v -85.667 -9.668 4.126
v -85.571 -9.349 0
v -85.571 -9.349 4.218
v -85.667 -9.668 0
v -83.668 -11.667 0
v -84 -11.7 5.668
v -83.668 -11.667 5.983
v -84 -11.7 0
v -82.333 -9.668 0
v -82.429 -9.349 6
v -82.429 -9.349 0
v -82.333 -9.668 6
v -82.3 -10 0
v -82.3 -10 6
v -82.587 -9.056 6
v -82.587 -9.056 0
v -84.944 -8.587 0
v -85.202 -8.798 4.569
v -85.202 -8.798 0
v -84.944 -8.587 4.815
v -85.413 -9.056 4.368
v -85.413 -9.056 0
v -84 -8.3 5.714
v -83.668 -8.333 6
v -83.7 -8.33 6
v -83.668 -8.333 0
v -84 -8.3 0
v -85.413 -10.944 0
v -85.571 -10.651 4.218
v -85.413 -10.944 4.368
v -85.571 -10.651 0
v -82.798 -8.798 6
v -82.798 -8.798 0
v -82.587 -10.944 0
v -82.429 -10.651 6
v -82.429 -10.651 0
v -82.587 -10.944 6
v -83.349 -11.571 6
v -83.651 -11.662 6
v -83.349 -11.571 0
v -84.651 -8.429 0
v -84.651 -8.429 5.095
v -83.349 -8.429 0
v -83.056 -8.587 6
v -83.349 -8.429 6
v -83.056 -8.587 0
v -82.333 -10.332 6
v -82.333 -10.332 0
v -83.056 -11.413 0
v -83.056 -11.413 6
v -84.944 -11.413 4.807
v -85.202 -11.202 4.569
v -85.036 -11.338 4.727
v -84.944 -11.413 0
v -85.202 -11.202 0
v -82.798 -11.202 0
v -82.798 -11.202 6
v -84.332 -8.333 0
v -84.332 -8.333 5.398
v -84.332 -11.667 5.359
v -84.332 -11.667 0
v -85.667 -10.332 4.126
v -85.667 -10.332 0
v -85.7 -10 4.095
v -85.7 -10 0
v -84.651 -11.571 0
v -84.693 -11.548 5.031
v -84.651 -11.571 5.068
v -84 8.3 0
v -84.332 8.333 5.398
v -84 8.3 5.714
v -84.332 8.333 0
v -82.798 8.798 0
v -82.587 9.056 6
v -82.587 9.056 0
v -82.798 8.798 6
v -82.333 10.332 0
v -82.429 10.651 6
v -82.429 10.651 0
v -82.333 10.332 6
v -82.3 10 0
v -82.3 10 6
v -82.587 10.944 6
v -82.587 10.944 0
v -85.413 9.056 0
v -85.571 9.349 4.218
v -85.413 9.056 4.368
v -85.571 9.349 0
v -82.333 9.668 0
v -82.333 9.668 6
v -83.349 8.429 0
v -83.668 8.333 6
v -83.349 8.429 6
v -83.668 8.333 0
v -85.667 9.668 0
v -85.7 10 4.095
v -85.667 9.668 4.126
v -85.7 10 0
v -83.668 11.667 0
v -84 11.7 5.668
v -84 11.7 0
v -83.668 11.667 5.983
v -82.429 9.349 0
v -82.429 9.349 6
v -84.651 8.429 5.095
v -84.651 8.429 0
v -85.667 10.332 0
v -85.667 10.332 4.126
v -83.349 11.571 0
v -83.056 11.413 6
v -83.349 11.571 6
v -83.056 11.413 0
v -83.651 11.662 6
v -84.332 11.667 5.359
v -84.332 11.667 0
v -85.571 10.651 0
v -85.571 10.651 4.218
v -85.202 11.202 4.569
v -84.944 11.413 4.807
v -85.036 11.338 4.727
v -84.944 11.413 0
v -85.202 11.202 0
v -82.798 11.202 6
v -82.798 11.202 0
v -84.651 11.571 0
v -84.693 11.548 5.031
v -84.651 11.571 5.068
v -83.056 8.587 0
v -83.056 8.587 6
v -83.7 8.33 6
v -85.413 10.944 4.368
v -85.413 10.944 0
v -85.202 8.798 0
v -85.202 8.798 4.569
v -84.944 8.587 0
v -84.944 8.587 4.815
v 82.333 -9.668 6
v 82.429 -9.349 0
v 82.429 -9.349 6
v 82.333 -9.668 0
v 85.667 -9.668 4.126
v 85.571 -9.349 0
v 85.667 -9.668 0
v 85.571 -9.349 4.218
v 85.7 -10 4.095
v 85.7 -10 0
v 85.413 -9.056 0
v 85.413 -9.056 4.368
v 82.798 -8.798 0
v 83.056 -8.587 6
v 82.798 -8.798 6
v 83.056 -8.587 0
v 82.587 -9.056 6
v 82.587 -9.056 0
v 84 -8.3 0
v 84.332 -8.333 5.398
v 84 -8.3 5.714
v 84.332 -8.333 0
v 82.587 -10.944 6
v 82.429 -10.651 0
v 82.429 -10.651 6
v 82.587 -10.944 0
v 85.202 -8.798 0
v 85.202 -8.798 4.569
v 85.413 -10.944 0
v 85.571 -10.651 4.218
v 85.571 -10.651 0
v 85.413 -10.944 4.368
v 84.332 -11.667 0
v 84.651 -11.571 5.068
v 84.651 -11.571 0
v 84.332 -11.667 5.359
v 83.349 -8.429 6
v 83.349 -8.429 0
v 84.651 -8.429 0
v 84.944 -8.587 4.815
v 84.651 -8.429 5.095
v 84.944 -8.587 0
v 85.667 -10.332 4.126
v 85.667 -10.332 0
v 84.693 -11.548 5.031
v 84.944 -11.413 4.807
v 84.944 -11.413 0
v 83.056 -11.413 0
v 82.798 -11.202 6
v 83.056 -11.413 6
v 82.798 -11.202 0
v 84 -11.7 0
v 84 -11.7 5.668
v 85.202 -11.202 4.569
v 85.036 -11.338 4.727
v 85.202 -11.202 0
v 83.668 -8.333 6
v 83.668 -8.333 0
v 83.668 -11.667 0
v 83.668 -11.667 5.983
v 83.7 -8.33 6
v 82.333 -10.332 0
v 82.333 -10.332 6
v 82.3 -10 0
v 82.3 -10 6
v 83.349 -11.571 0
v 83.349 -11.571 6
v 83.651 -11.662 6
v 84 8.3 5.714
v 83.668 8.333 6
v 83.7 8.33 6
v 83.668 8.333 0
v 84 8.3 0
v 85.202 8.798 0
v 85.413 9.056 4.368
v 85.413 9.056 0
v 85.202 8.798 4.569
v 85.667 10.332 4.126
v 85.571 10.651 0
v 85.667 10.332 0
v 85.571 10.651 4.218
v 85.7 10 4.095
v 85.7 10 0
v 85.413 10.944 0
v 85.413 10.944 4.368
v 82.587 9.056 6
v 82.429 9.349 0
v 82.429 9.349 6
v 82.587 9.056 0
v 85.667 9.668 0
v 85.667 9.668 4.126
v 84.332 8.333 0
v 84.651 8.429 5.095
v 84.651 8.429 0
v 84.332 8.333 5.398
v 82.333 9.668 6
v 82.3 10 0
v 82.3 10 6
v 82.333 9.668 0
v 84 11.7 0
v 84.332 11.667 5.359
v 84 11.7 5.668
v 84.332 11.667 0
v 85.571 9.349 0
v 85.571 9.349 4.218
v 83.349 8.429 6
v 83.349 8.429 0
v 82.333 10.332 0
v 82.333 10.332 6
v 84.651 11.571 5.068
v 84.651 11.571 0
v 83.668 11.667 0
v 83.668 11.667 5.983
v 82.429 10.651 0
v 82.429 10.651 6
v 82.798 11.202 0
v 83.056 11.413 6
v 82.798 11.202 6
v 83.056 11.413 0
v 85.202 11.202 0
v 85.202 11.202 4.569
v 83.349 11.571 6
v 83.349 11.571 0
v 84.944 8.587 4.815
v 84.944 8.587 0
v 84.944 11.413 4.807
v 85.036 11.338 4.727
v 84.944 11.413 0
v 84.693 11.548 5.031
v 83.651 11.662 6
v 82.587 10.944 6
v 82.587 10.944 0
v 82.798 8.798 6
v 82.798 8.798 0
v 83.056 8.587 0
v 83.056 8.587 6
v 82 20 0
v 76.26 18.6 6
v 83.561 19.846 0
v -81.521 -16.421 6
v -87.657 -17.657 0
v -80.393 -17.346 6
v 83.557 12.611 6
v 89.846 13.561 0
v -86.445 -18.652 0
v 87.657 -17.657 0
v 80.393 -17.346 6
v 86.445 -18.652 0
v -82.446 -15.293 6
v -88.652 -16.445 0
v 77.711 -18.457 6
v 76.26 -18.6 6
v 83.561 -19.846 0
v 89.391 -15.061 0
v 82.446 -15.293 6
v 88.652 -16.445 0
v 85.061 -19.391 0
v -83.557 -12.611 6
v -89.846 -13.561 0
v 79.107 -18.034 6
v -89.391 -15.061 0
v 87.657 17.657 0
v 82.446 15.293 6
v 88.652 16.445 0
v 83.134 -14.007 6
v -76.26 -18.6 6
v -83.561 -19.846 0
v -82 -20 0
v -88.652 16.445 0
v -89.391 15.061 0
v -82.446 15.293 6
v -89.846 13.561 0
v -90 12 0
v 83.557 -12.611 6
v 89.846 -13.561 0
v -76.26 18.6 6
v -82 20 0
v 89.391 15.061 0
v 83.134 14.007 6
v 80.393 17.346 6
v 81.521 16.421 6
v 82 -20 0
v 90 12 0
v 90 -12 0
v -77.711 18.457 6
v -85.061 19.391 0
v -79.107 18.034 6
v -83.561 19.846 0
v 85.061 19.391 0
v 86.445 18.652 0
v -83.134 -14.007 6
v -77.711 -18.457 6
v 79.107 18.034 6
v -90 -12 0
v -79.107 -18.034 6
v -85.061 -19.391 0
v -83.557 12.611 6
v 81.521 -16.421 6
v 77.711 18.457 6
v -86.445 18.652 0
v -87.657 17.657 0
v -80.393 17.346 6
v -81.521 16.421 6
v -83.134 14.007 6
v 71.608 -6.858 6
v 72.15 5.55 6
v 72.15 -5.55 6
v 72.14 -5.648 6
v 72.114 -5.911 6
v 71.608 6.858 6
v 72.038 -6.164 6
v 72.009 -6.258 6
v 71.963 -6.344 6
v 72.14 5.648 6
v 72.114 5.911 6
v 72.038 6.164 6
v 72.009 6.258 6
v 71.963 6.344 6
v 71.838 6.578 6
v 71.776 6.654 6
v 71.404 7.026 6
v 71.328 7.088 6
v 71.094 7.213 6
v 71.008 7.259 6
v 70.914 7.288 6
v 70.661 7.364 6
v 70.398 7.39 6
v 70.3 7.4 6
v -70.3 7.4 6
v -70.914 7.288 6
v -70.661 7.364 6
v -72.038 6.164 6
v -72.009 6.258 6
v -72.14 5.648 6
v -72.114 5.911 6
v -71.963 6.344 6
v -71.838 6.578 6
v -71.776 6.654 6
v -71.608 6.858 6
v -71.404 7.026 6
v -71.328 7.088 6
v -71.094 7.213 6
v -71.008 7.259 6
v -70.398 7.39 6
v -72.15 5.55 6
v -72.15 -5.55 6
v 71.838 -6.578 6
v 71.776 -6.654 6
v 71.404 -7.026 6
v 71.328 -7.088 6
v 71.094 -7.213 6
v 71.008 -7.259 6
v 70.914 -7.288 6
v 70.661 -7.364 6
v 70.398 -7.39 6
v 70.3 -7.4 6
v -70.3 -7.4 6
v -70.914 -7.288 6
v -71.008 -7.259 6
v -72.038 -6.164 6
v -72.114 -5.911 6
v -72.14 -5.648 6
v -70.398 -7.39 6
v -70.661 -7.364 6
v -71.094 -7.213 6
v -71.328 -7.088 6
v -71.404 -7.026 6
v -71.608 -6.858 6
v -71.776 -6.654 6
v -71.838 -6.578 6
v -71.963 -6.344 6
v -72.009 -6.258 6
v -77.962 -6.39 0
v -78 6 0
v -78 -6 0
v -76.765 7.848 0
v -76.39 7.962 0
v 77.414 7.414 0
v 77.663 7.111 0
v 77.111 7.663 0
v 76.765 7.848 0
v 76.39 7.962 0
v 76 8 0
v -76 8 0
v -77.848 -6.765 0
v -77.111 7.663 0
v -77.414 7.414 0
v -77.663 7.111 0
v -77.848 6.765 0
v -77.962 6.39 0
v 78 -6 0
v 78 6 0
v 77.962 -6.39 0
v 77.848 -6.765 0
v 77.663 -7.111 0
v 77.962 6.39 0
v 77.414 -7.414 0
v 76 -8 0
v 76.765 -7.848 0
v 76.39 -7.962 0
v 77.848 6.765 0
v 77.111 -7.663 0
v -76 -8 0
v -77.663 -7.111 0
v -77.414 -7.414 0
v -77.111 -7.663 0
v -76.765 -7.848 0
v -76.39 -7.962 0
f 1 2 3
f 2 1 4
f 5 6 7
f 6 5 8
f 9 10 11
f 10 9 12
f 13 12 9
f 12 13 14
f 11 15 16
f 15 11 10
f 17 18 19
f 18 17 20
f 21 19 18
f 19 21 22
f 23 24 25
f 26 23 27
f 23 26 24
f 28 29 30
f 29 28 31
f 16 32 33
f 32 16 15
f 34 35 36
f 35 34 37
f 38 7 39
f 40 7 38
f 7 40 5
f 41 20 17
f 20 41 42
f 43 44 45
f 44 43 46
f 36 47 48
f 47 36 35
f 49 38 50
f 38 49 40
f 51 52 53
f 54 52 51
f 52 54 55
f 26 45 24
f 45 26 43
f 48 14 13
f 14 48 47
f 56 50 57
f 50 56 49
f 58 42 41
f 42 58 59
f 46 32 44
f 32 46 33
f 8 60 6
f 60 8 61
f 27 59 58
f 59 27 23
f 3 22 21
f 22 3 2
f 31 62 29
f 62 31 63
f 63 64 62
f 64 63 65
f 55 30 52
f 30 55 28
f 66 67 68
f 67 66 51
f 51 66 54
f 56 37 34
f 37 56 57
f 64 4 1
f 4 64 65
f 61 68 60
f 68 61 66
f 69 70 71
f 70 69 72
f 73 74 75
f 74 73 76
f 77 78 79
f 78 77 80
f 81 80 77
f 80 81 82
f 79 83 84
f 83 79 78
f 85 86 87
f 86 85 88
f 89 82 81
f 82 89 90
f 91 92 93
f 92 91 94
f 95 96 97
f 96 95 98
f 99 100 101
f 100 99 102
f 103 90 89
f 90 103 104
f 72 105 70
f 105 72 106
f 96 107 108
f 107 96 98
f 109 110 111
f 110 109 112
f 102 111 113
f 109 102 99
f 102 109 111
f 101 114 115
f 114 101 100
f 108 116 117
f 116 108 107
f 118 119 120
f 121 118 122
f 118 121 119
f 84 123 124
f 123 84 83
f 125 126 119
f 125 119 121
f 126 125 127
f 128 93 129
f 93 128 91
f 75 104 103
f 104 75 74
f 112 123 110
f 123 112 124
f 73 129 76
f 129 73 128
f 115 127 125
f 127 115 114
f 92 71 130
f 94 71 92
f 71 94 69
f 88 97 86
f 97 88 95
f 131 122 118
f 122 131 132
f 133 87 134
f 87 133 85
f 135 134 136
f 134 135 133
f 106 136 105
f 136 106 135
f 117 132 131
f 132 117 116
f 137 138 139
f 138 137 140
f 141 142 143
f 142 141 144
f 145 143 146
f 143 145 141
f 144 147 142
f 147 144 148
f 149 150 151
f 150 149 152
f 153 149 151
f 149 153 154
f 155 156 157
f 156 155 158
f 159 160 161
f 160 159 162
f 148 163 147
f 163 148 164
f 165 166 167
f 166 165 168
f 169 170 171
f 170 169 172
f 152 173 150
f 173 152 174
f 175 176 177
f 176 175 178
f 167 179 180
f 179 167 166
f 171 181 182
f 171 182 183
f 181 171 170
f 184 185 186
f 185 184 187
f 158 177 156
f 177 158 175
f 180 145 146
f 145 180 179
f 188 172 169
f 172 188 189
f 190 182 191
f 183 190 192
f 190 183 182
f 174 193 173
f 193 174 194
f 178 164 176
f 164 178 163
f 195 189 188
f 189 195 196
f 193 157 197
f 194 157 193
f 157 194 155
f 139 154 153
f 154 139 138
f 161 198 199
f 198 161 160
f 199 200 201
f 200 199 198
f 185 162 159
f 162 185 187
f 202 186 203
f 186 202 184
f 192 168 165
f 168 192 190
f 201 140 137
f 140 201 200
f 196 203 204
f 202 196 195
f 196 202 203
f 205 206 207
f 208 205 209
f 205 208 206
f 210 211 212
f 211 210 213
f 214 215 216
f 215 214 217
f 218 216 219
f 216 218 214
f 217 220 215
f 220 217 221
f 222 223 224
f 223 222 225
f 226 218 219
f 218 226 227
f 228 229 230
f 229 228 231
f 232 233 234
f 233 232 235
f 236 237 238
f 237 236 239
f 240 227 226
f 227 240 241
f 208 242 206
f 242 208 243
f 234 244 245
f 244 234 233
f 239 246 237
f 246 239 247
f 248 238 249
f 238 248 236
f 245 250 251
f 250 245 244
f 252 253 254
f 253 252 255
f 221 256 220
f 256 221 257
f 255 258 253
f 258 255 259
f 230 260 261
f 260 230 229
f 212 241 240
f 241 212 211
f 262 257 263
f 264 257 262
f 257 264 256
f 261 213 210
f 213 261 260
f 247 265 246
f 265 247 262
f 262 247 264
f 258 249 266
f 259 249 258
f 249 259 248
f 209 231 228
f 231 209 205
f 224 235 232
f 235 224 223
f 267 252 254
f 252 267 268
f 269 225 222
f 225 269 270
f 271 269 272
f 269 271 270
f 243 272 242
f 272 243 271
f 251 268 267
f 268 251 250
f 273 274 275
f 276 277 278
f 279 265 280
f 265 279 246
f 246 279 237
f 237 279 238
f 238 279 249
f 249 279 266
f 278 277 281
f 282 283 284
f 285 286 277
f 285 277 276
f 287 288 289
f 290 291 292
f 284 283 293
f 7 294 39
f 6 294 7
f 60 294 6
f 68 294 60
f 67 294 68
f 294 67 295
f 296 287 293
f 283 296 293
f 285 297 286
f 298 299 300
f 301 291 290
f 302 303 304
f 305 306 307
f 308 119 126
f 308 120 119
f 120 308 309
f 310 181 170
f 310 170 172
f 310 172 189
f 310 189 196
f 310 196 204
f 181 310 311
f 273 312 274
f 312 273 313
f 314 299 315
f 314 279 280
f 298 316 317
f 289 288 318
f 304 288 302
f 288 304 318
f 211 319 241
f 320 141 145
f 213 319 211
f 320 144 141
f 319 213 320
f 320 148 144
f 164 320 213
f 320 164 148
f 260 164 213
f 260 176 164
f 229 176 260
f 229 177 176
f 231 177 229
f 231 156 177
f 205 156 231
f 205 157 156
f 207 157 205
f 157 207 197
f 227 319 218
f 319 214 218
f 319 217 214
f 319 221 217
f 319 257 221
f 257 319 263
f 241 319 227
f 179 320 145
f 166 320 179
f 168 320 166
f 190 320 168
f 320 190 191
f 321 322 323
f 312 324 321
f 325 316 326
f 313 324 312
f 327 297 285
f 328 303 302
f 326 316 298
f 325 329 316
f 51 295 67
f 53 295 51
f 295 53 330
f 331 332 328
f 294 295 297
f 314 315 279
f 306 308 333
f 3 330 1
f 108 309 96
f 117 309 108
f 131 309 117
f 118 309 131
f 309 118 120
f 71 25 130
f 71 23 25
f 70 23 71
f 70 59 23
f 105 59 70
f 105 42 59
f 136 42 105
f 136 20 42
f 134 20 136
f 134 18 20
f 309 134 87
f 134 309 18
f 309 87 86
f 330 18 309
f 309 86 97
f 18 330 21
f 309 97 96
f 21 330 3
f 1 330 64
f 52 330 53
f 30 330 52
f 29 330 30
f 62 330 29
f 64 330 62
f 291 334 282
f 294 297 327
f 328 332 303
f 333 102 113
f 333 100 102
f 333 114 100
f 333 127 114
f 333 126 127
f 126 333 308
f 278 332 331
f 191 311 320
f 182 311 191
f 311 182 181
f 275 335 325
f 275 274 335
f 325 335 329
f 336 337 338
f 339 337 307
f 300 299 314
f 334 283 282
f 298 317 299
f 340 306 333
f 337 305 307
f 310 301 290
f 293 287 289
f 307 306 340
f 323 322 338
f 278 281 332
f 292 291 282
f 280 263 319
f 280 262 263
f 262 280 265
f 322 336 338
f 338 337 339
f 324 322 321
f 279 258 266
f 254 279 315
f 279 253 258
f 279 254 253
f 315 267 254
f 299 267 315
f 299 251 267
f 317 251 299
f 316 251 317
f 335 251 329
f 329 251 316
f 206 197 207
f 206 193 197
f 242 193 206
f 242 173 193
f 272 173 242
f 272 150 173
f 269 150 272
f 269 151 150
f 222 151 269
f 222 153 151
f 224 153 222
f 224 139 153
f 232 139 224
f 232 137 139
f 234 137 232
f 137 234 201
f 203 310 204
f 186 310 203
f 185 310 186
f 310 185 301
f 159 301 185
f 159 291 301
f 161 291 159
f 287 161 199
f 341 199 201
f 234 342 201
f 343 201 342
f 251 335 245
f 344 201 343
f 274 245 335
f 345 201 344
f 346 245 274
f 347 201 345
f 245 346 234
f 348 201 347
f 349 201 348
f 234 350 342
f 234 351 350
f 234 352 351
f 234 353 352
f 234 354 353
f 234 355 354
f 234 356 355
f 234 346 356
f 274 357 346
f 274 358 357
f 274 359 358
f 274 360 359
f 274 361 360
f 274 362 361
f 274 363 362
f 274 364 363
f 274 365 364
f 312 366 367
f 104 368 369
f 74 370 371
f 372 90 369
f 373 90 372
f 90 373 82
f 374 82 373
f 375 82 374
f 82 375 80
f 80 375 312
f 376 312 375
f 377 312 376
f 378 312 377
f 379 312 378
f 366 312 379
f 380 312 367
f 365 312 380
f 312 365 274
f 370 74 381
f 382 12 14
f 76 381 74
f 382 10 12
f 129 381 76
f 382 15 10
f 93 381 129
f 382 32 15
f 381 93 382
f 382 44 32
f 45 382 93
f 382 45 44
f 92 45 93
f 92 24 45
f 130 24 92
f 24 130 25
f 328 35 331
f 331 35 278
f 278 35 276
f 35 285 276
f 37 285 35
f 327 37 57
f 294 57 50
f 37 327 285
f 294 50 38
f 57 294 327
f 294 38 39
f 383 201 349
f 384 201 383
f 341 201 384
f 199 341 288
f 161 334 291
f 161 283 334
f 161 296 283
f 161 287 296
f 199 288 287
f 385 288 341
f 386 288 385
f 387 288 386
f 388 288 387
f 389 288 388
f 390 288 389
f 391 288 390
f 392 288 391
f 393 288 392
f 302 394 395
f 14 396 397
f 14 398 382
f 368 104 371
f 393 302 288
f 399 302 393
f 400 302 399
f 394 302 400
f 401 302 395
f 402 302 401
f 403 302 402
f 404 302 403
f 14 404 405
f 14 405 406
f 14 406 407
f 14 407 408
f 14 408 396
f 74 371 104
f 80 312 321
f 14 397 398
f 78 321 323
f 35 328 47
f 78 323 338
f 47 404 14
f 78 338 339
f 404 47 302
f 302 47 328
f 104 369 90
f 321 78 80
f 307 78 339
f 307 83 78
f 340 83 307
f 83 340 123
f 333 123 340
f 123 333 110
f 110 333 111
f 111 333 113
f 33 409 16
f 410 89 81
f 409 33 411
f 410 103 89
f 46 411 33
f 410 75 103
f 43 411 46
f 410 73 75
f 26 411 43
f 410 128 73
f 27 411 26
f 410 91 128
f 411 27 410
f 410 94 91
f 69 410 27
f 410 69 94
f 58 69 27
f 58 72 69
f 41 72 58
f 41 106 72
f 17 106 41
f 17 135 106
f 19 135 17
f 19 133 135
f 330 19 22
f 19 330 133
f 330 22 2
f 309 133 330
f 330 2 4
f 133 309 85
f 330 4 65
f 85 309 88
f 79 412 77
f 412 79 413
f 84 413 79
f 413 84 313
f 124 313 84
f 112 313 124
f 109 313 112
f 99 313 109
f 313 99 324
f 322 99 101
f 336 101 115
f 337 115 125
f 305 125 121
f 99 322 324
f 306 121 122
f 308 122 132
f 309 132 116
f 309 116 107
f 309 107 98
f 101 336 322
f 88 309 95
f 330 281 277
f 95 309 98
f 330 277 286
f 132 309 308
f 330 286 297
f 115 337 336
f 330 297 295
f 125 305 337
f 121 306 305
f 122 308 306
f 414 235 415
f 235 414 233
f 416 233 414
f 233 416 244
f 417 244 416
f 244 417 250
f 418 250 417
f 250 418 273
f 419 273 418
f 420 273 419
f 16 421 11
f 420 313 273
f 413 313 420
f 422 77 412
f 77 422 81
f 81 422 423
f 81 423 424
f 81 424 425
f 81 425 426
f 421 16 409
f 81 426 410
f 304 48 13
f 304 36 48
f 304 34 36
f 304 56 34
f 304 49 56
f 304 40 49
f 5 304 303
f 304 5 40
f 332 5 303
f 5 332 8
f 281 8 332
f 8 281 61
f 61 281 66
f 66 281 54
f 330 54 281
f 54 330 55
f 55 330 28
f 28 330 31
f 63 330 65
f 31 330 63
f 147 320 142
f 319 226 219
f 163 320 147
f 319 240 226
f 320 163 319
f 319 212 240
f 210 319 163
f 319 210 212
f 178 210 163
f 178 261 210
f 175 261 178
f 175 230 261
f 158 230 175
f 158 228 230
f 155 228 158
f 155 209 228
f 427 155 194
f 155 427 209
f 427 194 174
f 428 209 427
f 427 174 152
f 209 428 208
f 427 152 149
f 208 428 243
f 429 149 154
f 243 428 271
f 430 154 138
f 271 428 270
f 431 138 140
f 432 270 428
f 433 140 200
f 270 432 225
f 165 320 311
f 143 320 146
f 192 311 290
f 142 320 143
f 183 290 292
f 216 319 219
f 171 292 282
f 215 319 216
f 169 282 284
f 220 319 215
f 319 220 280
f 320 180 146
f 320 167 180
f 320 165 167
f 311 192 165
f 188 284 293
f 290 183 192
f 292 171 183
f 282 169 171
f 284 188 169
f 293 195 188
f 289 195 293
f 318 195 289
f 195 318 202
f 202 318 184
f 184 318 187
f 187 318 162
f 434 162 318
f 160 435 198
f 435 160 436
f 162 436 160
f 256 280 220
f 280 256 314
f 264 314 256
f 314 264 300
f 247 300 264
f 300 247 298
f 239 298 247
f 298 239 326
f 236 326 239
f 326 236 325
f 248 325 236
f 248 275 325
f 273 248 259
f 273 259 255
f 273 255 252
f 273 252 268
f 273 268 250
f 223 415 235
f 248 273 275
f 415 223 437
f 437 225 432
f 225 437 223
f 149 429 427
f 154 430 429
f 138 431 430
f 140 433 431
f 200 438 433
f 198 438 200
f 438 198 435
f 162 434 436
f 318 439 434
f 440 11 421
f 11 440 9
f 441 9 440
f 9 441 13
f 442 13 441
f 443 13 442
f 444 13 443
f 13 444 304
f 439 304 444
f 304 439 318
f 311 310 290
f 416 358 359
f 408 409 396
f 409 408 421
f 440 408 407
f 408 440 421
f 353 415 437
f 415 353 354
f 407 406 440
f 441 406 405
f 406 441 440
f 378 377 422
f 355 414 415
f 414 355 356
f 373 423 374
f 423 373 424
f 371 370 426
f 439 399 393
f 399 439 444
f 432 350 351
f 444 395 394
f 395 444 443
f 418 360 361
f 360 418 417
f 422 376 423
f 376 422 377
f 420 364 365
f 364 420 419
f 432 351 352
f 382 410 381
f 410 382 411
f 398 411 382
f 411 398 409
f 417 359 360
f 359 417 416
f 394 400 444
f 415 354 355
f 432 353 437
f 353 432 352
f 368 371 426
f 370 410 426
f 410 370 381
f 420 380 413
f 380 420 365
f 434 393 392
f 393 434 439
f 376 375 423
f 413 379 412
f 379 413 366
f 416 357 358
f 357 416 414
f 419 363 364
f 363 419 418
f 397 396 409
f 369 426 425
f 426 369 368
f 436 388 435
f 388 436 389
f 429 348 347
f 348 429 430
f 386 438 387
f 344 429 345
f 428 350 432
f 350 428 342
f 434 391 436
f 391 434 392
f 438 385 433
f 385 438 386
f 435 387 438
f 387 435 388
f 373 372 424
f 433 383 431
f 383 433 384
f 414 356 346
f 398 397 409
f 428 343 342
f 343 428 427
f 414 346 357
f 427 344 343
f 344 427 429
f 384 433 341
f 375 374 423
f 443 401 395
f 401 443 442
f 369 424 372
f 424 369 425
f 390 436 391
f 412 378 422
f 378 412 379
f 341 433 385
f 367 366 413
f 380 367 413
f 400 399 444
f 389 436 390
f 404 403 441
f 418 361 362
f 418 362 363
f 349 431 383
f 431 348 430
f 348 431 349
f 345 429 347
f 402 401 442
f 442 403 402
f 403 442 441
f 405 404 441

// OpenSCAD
$fn = 32;

// ----------------------------------------------------------------------
// Display bezel: 180 x 40 mm frame, opening 156x16 mm
// ----------------------------------------------------------------------

// --- parameters (mm) ---
length = 180;             // frame outside length, X
width = 40;               // frame outside width, Y
frame_w = 12;             // frame width
thickness = 6;            // frame thickness
corner_r = 8;             // outside corner radius
chamfer = 0.93;           // outer wall taper
funnel = 0.9;             // inner opening taper
opening_l = 156;          // opening length
opening_w = 16;           // opening width
inner_r = 2;              // opening corner radius
hole_d = 3.4;             // mounting screw clearance
holes_per_side = 2;       // holes per short side
hole_inset = 6;           // hole centre inset from the outside edge

/* rounded-rectangle outlines, generated with loops */
module rounded_ring(l_nom, w_nom, r) {
  hull() {
    for (sx = [-1, 1]) for (sy = [-1, 1])
      translate([sx * (l_nom / 2 - r), sy * (w_nom / 2 - r)]) circle(r = r);
  }
}

difference() {
  /* frame body, drafted so the outer edge is a variable-depth chamfer */
  linear_extrude(height = thickness, scale = chamfer)
    rounded_ring(length, width, corner_r);
  /* viewing opening, drafted the other way for a funnel edge */
  linear_extrude(height = thickness + 2, scale = funnel)
    translate([0, 0, -1]) rounded_ring(opening_l, opening_w, inner_r);
  /* mounting screws through the frame lands */
  for (sx = [-1, 1]) for (i = [1 : holes_per_side])
    translate([sx * (length / 2 - hole_inset),
               (i - (holes_per_side + 1) / 2) * width * 0.5, -1])
      cylinder(h = thickness + 2, d = hole_d);
}
